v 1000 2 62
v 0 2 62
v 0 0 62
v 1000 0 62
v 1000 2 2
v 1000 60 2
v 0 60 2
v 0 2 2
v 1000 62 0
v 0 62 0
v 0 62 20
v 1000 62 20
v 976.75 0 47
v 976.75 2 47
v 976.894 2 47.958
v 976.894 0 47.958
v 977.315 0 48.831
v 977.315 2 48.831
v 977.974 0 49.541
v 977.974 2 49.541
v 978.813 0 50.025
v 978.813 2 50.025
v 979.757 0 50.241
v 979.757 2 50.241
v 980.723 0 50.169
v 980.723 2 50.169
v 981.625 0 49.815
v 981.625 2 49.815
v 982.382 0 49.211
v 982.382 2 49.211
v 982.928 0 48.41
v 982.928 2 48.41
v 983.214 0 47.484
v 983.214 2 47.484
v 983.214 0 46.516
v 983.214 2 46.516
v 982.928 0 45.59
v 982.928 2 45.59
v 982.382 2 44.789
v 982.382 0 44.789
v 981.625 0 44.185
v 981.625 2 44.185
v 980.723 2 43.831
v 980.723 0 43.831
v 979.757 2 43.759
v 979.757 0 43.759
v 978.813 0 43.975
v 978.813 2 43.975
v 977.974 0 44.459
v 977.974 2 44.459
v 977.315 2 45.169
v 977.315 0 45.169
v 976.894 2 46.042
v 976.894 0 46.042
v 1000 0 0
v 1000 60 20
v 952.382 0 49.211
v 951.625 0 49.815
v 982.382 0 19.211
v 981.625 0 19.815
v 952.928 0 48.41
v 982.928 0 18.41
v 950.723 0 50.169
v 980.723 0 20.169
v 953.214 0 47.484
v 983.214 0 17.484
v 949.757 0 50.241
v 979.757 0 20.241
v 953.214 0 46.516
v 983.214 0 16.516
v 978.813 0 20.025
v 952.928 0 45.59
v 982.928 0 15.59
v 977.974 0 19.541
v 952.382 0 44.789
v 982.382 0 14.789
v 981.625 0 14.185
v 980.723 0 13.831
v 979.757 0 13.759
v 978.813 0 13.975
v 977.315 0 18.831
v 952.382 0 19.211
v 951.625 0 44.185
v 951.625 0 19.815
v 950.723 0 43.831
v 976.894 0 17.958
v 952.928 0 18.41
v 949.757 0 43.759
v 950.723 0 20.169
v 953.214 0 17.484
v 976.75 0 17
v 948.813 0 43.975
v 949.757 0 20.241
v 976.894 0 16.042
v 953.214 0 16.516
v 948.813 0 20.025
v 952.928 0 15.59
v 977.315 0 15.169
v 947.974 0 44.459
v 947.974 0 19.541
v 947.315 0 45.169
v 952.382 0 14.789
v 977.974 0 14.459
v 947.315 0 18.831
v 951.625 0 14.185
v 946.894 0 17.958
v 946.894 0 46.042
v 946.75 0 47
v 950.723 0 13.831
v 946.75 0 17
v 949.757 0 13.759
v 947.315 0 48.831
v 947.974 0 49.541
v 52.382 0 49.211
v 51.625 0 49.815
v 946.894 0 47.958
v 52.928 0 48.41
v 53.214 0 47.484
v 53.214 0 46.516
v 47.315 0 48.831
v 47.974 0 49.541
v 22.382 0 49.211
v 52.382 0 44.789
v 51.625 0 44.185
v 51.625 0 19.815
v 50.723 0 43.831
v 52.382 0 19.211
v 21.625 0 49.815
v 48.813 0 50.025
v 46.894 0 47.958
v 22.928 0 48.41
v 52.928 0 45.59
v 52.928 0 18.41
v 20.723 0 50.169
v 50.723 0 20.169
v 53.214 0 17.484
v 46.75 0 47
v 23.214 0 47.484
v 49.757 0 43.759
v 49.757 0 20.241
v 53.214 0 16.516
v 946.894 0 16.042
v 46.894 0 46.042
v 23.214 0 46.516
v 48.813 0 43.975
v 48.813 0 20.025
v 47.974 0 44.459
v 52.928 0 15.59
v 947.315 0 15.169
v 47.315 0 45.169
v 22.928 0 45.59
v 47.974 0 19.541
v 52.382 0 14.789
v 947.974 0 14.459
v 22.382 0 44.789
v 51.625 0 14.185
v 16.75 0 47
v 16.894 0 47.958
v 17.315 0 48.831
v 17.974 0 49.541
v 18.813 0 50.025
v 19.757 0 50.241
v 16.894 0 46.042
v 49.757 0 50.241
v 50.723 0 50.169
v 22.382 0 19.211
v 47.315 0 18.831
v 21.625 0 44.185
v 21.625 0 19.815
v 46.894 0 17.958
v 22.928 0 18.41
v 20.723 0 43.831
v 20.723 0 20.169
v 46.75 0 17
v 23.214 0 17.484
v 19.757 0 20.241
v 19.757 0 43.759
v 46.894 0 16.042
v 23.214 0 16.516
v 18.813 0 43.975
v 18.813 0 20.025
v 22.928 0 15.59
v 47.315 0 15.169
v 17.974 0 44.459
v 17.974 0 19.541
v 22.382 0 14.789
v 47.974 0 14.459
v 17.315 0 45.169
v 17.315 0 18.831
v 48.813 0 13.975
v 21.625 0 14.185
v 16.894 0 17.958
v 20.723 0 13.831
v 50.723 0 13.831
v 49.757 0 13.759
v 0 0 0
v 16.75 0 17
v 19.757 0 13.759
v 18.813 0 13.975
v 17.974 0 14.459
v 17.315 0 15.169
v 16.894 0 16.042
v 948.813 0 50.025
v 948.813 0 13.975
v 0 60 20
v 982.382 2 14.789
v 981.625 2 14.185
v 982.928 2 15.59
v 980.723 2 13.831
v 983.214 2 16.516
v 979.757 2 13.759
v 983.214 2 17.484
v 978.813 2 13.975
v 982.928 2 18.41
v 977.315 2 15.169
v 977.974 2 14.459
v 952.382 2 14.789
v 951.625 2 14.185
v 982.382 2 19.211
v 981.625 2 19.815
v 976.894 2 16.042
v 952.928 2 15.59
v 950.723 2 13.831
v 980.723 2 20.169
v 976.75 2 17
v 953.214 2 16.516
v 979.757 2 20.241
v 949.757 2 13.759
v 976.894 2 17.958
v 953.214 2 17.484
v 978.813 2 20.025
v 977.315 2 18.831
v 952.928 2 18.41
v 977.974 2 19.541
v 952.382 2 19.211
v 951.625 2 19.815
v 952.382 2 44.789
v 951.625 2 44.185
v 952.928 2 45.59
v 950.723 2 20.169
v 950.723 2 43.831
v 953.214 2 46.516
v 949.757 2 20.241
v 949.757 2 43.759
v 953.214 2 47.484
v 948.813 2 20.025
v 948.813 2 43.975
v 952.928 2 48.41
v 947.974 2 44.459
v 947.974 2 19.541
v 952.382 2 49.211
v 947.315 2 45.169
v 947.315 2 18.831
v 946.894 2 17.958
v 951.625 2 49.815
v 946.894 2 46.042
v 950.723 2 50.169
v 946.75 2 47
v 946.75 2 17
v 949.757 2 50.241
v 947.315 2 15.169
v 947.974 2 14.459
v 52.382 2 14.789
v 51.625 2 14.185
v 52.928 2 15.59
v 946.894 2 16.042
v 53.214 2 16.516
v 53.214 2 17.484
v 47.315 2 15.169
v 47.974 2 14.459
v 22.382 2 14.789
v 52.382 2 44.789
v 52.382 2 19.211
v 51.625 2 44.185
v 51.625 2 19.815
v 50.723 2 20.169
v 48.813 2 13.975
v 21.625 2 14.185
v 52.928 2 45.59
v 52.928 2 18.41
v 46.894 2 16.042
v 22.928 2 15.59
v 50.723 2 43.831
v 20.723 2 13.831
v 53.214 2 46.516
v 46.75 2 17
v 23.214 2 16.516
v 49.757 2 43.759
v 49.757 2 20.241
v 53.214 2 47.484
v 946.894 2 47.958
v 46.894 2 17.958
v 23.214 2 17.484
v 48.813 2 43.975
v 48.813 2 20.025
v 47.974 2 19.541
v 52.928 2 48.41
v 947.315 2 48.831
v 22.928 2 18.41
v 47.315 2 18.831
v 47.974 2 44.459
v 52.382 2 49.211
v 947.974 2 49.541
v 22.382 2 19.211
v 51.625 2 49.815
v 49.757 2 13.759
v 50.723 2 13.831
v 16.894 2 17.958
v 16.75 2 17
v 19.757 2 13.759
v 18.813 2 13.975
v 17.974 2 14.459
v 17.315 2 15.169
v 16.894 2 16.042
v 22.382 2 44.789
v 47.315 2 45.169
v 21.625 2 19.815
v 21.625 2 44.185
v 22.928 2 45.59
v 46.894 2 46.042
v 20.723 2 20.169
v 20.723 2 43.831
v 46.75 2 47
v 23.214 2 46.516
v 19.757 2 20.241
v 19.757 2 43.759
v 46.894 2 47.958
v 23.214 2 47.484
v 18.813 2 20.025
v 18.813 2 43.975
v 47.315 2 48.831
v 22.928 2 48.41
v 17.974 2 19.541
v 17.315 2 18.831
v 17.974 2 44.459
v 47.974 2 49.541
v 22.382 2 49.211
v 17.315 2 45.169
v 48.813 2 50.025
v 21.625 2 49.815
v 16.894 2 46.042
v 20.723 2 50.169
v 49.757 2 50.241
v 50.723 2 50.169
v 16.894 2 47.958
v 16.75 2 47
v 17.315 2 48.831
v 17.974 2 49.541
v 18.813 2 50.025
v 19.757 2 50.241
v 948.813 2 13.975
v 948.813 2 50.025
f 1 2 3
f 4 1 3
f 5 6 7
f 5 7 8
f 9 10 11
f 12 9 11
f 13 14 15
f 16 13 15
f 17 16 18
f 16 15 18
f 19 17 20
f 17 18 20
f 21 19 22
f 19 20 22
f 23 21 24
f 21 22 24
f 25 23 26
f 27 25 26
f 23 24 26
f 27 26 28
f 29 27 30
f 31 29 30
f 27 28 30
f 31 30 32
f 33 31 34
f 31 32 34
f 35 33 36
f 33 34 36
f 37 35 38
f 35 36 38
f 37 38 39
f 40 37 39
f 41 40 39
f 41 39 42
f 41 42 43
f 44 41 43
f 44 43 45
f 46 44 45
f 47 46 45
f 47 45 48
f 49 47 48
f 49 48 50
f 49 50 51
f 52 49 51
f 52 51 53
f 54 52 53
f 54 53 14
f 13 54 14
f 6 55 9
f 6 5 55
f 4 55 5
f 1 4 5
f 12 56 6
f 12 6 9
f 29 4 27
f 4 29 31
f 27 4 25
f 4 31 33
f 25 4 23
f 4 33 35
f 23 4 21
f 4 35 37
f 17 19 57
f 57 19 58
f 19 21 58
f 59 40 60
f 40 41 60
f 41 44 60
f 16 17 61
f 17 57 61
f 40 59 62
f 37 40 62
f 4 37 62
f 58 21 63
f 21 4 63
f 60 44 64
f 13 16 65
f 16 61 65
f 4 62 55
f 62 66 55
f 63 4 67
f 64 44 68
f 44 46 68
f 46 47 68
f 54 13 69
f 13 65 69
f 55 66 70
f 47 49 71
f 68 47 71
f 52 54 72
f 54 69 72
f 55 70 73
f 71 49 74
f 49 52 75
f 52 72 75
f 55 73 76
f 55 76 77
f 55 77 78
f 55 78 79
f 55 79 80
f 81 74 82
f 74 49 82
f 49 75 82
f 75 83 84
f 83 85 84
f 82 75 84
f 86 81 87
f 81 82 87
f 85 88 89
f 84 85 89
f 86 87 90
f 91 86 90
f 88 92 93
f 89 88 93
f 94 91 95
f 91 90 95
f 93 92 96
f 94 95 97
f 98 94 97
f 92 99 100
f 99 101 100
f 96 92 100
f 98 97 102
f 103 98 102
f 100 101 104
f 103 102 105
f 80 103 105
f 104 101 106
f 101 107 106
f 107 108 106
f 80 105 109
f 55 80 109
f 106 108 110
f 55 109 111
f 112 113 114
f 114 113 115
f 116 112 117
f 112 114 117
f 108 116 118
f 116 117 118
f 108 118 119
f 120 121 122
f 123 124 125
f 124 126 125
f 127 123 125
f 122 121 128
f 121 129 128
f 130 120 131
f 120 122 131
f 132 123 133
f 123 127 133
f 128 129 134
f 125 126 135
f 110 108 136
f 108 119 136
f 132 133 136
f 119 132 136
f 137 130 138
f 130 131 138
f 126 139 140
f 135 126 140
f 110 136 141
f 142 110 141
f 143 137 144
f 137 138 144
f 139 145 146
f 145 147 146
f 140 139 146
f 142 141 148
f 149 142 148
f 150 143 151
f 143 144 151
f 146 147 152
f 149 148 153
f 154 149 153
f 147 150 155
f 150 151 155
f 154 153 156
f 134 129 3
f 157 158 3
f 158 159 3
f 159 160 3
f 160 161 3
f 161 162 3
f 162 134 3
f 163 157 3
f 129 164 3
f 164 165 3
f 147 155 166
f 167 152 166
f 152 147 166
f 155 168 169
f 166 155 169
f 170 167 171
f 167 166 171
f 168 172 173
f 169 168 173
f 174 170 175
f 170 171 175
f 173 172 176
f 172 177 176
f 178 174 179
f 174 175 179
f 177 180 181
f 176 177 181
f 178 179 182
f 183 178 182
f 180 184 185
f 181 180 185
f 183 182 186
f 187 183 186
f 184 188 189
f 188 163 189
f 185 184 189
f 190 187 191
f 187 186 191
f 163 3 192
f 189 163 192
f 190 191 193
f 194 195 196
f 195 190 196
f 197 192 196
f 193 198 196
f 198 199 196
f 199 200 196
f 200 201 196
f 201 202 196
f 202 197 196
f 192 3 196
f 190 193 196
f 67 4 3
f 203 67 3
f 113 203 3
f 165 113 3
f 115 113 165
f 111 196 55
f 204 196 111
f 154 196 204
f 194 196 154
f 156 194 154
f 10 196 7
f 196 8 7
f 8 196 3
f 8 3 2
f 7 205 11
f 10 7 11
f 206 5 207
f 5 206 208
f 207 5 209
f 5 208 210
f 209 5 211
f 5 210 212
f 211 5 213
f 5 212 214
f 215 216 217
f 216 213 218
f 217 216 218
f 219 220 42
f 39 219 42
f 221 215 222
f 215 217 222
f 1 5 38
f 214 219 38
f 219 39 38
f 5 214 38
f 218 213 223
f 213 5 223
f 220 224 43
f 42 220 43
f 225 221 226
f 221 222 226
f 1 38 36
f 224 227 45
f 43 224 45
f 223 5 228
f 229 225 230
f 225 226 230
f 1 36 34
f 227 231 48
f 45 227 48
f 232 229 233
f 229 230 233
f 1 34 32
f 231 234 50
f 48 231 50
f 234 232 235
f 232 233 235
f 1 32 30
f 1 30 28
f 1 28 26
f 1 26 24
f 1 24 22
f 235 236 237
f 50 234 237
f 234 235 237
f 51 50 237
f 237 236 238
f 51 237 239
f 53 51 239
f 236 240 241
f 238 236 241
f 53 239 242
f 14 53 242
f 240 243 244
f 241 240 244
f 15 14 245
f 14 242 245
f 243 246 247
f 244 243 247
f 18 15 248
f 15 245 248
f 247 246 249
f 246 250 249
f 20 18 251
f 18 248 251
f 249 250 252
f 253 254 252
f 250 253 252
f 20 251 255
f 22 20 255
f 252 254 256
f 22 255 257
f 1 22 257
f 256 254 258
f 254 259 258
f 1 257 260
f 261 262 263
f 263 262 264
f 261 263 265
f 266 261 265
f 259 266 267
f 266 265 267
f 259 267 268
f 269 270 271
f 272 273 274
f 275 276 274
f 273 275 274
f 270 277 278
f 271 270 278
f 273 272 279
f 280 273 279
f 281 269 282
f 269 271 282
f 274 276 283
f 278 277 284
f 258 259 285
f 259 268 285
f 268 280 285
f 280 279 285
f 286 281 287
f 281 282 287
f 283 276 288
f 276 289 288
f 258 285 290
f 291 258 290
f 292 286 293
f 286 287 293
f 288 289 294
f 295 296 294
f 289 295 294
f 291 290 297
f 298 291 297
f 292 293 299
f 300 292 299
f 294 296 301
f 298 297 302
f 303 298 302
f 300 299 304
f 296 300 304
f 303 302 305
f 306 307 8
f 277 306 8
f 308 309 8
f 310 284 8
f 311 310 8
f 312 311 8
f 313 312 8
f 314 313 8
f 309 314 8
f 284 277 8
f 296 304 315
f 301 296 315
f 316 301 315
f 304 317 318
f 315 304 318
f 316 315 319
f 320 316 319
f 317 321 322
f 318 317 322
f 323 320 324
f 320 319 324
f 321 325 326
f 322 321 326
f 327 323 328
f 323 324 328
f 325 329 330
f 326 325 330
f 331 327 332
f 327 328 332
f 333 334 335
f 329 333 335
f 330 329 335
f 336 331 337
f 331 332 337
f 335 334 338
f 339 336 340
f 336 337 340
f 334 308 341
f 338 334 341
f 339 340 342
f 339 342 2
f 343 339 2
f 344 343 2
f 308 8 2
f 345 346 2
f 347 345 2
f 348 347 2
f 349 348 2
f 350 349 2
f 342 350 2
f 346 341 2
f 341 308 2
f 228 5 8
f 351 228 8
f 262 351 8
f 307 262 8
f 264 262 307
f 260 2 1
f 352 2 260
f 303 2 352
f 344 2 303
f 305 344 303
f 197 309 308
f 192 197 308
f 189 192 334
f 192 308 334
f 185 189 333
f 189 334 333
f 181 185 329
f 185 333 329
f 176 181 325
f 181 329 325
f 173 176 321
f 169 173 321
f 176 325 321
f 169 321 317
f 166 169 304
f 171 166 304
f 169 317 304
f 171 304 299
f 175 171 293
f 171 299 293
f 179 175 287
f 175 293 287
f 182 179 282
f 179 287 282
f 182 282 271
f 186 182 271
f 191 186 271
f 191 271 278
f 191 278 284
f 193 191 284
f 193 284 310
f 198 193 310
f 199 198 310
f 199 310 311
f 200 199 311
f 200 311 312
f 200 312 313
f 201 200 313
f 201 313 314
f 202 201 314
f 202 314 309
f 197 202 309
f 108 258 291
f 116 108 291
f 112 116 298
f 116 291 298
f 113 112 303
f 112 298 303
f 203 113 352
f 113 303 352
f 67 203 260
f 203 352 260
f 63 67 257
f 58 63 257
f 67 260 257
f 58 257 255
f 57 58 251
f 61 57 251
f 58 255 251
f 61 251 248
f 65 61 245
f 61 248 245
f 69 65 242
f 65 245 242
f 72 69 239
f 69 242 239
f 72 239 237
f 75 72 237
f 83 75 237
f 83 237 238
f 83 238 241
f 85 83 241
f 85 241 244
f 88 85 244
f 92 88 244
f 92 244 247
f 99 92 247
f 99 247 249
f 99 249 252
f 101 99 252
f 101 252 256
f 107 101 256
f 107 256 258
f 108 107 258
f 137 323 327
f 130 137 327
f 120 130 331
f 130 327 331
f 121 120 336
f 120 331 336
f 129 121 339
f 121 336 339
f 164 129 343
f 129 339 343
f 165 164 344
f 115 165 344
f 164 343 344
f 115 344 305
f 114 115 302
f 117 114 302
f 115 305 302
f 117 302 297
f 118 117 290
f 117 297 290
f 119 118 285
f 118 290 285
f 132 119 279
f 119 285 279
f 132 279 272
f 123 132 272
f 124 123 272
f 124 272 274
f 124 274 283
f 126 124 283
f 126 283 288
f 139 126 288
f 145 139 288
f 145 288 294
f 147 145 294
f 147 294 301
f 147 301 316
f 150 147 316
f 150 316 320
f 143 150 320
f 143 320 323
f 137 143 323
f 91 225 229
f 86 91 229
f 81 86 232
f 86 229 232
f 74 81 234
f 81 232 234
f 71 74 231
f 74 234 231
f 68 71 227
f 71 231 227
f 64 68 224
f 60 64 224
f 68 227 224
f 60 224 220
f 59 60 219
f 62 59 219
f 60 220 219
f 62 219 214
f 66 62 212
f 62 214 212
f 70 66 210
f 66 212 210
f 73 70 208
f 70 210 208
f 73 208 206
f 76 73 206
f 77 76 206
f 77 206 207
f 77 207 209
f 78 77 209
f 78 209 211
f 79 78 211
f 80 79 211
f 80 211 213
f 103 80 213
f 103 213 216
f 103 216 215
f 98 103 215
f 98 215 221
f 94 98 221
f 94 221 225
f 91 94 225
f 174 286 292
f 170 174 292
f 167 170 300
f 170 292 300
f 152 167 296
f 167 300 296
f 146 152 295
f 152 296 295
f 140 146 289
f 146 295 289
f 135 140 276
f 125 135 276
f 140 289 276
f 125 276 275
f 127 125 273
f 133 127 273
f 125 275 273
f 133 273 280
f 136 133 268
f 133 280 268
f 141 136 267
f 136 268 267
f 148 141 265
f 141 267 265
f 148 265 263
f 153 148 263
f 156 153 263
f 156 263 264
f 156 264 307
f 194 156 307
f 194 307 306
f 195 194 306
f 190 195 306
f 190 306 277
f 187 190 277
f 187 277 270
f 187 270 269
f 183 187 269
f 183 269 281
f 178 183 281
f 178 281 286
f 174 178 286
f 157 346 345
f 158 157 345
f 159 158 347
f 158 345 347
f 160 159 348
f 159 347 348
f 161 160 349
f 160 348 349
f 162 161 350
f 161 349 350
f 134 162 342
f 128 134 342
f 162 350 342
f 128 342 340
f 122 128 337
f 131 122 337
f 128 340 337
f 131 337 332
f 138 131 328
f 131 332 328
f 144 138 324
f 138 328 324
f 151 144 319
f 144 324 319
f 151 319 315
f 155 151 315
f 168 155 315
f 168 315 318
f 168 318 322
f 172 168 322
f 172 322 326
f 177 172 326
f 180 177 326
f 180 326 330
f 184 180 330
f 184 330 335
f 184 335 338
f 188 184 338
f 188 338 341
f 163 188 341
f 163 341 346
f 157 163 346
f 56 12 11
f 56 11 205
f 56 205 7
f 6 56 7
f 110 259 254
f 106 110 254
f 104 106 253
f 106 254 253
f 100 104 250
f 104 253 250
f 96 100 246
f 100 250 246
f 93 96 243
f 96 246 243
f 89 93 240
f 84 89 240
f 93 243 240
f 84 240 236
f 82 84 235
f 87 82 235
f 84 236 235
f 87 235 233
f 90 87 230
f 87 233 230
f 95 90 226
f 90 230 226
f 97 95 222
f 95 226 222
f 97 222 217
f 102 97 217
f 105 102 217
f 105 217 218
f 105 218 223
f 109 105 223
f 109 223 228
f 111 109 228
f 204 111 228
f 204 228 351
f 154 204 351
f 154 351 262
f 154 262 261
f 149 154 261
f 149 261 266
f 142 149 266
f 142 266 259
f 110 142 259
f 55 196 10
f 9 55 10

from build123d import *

# Parameters (mm, degrees)
F1_DEPTH = 1000
F2_R     = 3.25
F3_DEPTH = 25


with BuildPart() as f1:
    # F0 (on Right) → F1 (new body)
    with BuildSketch(Plane.YZ):
        Polygon((0, 62), (0, 0), (62, 0), (62, 20), (60, 20), (60, 2), (2, 2), (2, 62), align=None)
    extrude(amount=F1_DEPTH)

    # F2 (on face) → F3 (cut)
    with BuildSketch(Plane(origin=(0, 2, 0), x_dir=(-1, 0, 0), z_dir=(0, 1, 0))):
        with Locations((-980, 47)):
            Circle(F2_R)
        with Locations((-950, 47)):
            Circle(F2_R)
        with Locations((-980, 17)):
            Circle(F2_R)
        with Locations((-950, 17)):
            Circle(F2_R)
        with Locations((-50, 47)):
            Circle(F2_R)
        with Locations((-20, 47)):
            Circle(F2_R)
        with Locations((-20, 17)):
            Circle(F2_R)
        with Locations((-50, 17)):
            Circle(F2_R)
    extrude(amount=-F3_DEPTH, mode=Mode.SUBTRACT)


solid = f1.part
